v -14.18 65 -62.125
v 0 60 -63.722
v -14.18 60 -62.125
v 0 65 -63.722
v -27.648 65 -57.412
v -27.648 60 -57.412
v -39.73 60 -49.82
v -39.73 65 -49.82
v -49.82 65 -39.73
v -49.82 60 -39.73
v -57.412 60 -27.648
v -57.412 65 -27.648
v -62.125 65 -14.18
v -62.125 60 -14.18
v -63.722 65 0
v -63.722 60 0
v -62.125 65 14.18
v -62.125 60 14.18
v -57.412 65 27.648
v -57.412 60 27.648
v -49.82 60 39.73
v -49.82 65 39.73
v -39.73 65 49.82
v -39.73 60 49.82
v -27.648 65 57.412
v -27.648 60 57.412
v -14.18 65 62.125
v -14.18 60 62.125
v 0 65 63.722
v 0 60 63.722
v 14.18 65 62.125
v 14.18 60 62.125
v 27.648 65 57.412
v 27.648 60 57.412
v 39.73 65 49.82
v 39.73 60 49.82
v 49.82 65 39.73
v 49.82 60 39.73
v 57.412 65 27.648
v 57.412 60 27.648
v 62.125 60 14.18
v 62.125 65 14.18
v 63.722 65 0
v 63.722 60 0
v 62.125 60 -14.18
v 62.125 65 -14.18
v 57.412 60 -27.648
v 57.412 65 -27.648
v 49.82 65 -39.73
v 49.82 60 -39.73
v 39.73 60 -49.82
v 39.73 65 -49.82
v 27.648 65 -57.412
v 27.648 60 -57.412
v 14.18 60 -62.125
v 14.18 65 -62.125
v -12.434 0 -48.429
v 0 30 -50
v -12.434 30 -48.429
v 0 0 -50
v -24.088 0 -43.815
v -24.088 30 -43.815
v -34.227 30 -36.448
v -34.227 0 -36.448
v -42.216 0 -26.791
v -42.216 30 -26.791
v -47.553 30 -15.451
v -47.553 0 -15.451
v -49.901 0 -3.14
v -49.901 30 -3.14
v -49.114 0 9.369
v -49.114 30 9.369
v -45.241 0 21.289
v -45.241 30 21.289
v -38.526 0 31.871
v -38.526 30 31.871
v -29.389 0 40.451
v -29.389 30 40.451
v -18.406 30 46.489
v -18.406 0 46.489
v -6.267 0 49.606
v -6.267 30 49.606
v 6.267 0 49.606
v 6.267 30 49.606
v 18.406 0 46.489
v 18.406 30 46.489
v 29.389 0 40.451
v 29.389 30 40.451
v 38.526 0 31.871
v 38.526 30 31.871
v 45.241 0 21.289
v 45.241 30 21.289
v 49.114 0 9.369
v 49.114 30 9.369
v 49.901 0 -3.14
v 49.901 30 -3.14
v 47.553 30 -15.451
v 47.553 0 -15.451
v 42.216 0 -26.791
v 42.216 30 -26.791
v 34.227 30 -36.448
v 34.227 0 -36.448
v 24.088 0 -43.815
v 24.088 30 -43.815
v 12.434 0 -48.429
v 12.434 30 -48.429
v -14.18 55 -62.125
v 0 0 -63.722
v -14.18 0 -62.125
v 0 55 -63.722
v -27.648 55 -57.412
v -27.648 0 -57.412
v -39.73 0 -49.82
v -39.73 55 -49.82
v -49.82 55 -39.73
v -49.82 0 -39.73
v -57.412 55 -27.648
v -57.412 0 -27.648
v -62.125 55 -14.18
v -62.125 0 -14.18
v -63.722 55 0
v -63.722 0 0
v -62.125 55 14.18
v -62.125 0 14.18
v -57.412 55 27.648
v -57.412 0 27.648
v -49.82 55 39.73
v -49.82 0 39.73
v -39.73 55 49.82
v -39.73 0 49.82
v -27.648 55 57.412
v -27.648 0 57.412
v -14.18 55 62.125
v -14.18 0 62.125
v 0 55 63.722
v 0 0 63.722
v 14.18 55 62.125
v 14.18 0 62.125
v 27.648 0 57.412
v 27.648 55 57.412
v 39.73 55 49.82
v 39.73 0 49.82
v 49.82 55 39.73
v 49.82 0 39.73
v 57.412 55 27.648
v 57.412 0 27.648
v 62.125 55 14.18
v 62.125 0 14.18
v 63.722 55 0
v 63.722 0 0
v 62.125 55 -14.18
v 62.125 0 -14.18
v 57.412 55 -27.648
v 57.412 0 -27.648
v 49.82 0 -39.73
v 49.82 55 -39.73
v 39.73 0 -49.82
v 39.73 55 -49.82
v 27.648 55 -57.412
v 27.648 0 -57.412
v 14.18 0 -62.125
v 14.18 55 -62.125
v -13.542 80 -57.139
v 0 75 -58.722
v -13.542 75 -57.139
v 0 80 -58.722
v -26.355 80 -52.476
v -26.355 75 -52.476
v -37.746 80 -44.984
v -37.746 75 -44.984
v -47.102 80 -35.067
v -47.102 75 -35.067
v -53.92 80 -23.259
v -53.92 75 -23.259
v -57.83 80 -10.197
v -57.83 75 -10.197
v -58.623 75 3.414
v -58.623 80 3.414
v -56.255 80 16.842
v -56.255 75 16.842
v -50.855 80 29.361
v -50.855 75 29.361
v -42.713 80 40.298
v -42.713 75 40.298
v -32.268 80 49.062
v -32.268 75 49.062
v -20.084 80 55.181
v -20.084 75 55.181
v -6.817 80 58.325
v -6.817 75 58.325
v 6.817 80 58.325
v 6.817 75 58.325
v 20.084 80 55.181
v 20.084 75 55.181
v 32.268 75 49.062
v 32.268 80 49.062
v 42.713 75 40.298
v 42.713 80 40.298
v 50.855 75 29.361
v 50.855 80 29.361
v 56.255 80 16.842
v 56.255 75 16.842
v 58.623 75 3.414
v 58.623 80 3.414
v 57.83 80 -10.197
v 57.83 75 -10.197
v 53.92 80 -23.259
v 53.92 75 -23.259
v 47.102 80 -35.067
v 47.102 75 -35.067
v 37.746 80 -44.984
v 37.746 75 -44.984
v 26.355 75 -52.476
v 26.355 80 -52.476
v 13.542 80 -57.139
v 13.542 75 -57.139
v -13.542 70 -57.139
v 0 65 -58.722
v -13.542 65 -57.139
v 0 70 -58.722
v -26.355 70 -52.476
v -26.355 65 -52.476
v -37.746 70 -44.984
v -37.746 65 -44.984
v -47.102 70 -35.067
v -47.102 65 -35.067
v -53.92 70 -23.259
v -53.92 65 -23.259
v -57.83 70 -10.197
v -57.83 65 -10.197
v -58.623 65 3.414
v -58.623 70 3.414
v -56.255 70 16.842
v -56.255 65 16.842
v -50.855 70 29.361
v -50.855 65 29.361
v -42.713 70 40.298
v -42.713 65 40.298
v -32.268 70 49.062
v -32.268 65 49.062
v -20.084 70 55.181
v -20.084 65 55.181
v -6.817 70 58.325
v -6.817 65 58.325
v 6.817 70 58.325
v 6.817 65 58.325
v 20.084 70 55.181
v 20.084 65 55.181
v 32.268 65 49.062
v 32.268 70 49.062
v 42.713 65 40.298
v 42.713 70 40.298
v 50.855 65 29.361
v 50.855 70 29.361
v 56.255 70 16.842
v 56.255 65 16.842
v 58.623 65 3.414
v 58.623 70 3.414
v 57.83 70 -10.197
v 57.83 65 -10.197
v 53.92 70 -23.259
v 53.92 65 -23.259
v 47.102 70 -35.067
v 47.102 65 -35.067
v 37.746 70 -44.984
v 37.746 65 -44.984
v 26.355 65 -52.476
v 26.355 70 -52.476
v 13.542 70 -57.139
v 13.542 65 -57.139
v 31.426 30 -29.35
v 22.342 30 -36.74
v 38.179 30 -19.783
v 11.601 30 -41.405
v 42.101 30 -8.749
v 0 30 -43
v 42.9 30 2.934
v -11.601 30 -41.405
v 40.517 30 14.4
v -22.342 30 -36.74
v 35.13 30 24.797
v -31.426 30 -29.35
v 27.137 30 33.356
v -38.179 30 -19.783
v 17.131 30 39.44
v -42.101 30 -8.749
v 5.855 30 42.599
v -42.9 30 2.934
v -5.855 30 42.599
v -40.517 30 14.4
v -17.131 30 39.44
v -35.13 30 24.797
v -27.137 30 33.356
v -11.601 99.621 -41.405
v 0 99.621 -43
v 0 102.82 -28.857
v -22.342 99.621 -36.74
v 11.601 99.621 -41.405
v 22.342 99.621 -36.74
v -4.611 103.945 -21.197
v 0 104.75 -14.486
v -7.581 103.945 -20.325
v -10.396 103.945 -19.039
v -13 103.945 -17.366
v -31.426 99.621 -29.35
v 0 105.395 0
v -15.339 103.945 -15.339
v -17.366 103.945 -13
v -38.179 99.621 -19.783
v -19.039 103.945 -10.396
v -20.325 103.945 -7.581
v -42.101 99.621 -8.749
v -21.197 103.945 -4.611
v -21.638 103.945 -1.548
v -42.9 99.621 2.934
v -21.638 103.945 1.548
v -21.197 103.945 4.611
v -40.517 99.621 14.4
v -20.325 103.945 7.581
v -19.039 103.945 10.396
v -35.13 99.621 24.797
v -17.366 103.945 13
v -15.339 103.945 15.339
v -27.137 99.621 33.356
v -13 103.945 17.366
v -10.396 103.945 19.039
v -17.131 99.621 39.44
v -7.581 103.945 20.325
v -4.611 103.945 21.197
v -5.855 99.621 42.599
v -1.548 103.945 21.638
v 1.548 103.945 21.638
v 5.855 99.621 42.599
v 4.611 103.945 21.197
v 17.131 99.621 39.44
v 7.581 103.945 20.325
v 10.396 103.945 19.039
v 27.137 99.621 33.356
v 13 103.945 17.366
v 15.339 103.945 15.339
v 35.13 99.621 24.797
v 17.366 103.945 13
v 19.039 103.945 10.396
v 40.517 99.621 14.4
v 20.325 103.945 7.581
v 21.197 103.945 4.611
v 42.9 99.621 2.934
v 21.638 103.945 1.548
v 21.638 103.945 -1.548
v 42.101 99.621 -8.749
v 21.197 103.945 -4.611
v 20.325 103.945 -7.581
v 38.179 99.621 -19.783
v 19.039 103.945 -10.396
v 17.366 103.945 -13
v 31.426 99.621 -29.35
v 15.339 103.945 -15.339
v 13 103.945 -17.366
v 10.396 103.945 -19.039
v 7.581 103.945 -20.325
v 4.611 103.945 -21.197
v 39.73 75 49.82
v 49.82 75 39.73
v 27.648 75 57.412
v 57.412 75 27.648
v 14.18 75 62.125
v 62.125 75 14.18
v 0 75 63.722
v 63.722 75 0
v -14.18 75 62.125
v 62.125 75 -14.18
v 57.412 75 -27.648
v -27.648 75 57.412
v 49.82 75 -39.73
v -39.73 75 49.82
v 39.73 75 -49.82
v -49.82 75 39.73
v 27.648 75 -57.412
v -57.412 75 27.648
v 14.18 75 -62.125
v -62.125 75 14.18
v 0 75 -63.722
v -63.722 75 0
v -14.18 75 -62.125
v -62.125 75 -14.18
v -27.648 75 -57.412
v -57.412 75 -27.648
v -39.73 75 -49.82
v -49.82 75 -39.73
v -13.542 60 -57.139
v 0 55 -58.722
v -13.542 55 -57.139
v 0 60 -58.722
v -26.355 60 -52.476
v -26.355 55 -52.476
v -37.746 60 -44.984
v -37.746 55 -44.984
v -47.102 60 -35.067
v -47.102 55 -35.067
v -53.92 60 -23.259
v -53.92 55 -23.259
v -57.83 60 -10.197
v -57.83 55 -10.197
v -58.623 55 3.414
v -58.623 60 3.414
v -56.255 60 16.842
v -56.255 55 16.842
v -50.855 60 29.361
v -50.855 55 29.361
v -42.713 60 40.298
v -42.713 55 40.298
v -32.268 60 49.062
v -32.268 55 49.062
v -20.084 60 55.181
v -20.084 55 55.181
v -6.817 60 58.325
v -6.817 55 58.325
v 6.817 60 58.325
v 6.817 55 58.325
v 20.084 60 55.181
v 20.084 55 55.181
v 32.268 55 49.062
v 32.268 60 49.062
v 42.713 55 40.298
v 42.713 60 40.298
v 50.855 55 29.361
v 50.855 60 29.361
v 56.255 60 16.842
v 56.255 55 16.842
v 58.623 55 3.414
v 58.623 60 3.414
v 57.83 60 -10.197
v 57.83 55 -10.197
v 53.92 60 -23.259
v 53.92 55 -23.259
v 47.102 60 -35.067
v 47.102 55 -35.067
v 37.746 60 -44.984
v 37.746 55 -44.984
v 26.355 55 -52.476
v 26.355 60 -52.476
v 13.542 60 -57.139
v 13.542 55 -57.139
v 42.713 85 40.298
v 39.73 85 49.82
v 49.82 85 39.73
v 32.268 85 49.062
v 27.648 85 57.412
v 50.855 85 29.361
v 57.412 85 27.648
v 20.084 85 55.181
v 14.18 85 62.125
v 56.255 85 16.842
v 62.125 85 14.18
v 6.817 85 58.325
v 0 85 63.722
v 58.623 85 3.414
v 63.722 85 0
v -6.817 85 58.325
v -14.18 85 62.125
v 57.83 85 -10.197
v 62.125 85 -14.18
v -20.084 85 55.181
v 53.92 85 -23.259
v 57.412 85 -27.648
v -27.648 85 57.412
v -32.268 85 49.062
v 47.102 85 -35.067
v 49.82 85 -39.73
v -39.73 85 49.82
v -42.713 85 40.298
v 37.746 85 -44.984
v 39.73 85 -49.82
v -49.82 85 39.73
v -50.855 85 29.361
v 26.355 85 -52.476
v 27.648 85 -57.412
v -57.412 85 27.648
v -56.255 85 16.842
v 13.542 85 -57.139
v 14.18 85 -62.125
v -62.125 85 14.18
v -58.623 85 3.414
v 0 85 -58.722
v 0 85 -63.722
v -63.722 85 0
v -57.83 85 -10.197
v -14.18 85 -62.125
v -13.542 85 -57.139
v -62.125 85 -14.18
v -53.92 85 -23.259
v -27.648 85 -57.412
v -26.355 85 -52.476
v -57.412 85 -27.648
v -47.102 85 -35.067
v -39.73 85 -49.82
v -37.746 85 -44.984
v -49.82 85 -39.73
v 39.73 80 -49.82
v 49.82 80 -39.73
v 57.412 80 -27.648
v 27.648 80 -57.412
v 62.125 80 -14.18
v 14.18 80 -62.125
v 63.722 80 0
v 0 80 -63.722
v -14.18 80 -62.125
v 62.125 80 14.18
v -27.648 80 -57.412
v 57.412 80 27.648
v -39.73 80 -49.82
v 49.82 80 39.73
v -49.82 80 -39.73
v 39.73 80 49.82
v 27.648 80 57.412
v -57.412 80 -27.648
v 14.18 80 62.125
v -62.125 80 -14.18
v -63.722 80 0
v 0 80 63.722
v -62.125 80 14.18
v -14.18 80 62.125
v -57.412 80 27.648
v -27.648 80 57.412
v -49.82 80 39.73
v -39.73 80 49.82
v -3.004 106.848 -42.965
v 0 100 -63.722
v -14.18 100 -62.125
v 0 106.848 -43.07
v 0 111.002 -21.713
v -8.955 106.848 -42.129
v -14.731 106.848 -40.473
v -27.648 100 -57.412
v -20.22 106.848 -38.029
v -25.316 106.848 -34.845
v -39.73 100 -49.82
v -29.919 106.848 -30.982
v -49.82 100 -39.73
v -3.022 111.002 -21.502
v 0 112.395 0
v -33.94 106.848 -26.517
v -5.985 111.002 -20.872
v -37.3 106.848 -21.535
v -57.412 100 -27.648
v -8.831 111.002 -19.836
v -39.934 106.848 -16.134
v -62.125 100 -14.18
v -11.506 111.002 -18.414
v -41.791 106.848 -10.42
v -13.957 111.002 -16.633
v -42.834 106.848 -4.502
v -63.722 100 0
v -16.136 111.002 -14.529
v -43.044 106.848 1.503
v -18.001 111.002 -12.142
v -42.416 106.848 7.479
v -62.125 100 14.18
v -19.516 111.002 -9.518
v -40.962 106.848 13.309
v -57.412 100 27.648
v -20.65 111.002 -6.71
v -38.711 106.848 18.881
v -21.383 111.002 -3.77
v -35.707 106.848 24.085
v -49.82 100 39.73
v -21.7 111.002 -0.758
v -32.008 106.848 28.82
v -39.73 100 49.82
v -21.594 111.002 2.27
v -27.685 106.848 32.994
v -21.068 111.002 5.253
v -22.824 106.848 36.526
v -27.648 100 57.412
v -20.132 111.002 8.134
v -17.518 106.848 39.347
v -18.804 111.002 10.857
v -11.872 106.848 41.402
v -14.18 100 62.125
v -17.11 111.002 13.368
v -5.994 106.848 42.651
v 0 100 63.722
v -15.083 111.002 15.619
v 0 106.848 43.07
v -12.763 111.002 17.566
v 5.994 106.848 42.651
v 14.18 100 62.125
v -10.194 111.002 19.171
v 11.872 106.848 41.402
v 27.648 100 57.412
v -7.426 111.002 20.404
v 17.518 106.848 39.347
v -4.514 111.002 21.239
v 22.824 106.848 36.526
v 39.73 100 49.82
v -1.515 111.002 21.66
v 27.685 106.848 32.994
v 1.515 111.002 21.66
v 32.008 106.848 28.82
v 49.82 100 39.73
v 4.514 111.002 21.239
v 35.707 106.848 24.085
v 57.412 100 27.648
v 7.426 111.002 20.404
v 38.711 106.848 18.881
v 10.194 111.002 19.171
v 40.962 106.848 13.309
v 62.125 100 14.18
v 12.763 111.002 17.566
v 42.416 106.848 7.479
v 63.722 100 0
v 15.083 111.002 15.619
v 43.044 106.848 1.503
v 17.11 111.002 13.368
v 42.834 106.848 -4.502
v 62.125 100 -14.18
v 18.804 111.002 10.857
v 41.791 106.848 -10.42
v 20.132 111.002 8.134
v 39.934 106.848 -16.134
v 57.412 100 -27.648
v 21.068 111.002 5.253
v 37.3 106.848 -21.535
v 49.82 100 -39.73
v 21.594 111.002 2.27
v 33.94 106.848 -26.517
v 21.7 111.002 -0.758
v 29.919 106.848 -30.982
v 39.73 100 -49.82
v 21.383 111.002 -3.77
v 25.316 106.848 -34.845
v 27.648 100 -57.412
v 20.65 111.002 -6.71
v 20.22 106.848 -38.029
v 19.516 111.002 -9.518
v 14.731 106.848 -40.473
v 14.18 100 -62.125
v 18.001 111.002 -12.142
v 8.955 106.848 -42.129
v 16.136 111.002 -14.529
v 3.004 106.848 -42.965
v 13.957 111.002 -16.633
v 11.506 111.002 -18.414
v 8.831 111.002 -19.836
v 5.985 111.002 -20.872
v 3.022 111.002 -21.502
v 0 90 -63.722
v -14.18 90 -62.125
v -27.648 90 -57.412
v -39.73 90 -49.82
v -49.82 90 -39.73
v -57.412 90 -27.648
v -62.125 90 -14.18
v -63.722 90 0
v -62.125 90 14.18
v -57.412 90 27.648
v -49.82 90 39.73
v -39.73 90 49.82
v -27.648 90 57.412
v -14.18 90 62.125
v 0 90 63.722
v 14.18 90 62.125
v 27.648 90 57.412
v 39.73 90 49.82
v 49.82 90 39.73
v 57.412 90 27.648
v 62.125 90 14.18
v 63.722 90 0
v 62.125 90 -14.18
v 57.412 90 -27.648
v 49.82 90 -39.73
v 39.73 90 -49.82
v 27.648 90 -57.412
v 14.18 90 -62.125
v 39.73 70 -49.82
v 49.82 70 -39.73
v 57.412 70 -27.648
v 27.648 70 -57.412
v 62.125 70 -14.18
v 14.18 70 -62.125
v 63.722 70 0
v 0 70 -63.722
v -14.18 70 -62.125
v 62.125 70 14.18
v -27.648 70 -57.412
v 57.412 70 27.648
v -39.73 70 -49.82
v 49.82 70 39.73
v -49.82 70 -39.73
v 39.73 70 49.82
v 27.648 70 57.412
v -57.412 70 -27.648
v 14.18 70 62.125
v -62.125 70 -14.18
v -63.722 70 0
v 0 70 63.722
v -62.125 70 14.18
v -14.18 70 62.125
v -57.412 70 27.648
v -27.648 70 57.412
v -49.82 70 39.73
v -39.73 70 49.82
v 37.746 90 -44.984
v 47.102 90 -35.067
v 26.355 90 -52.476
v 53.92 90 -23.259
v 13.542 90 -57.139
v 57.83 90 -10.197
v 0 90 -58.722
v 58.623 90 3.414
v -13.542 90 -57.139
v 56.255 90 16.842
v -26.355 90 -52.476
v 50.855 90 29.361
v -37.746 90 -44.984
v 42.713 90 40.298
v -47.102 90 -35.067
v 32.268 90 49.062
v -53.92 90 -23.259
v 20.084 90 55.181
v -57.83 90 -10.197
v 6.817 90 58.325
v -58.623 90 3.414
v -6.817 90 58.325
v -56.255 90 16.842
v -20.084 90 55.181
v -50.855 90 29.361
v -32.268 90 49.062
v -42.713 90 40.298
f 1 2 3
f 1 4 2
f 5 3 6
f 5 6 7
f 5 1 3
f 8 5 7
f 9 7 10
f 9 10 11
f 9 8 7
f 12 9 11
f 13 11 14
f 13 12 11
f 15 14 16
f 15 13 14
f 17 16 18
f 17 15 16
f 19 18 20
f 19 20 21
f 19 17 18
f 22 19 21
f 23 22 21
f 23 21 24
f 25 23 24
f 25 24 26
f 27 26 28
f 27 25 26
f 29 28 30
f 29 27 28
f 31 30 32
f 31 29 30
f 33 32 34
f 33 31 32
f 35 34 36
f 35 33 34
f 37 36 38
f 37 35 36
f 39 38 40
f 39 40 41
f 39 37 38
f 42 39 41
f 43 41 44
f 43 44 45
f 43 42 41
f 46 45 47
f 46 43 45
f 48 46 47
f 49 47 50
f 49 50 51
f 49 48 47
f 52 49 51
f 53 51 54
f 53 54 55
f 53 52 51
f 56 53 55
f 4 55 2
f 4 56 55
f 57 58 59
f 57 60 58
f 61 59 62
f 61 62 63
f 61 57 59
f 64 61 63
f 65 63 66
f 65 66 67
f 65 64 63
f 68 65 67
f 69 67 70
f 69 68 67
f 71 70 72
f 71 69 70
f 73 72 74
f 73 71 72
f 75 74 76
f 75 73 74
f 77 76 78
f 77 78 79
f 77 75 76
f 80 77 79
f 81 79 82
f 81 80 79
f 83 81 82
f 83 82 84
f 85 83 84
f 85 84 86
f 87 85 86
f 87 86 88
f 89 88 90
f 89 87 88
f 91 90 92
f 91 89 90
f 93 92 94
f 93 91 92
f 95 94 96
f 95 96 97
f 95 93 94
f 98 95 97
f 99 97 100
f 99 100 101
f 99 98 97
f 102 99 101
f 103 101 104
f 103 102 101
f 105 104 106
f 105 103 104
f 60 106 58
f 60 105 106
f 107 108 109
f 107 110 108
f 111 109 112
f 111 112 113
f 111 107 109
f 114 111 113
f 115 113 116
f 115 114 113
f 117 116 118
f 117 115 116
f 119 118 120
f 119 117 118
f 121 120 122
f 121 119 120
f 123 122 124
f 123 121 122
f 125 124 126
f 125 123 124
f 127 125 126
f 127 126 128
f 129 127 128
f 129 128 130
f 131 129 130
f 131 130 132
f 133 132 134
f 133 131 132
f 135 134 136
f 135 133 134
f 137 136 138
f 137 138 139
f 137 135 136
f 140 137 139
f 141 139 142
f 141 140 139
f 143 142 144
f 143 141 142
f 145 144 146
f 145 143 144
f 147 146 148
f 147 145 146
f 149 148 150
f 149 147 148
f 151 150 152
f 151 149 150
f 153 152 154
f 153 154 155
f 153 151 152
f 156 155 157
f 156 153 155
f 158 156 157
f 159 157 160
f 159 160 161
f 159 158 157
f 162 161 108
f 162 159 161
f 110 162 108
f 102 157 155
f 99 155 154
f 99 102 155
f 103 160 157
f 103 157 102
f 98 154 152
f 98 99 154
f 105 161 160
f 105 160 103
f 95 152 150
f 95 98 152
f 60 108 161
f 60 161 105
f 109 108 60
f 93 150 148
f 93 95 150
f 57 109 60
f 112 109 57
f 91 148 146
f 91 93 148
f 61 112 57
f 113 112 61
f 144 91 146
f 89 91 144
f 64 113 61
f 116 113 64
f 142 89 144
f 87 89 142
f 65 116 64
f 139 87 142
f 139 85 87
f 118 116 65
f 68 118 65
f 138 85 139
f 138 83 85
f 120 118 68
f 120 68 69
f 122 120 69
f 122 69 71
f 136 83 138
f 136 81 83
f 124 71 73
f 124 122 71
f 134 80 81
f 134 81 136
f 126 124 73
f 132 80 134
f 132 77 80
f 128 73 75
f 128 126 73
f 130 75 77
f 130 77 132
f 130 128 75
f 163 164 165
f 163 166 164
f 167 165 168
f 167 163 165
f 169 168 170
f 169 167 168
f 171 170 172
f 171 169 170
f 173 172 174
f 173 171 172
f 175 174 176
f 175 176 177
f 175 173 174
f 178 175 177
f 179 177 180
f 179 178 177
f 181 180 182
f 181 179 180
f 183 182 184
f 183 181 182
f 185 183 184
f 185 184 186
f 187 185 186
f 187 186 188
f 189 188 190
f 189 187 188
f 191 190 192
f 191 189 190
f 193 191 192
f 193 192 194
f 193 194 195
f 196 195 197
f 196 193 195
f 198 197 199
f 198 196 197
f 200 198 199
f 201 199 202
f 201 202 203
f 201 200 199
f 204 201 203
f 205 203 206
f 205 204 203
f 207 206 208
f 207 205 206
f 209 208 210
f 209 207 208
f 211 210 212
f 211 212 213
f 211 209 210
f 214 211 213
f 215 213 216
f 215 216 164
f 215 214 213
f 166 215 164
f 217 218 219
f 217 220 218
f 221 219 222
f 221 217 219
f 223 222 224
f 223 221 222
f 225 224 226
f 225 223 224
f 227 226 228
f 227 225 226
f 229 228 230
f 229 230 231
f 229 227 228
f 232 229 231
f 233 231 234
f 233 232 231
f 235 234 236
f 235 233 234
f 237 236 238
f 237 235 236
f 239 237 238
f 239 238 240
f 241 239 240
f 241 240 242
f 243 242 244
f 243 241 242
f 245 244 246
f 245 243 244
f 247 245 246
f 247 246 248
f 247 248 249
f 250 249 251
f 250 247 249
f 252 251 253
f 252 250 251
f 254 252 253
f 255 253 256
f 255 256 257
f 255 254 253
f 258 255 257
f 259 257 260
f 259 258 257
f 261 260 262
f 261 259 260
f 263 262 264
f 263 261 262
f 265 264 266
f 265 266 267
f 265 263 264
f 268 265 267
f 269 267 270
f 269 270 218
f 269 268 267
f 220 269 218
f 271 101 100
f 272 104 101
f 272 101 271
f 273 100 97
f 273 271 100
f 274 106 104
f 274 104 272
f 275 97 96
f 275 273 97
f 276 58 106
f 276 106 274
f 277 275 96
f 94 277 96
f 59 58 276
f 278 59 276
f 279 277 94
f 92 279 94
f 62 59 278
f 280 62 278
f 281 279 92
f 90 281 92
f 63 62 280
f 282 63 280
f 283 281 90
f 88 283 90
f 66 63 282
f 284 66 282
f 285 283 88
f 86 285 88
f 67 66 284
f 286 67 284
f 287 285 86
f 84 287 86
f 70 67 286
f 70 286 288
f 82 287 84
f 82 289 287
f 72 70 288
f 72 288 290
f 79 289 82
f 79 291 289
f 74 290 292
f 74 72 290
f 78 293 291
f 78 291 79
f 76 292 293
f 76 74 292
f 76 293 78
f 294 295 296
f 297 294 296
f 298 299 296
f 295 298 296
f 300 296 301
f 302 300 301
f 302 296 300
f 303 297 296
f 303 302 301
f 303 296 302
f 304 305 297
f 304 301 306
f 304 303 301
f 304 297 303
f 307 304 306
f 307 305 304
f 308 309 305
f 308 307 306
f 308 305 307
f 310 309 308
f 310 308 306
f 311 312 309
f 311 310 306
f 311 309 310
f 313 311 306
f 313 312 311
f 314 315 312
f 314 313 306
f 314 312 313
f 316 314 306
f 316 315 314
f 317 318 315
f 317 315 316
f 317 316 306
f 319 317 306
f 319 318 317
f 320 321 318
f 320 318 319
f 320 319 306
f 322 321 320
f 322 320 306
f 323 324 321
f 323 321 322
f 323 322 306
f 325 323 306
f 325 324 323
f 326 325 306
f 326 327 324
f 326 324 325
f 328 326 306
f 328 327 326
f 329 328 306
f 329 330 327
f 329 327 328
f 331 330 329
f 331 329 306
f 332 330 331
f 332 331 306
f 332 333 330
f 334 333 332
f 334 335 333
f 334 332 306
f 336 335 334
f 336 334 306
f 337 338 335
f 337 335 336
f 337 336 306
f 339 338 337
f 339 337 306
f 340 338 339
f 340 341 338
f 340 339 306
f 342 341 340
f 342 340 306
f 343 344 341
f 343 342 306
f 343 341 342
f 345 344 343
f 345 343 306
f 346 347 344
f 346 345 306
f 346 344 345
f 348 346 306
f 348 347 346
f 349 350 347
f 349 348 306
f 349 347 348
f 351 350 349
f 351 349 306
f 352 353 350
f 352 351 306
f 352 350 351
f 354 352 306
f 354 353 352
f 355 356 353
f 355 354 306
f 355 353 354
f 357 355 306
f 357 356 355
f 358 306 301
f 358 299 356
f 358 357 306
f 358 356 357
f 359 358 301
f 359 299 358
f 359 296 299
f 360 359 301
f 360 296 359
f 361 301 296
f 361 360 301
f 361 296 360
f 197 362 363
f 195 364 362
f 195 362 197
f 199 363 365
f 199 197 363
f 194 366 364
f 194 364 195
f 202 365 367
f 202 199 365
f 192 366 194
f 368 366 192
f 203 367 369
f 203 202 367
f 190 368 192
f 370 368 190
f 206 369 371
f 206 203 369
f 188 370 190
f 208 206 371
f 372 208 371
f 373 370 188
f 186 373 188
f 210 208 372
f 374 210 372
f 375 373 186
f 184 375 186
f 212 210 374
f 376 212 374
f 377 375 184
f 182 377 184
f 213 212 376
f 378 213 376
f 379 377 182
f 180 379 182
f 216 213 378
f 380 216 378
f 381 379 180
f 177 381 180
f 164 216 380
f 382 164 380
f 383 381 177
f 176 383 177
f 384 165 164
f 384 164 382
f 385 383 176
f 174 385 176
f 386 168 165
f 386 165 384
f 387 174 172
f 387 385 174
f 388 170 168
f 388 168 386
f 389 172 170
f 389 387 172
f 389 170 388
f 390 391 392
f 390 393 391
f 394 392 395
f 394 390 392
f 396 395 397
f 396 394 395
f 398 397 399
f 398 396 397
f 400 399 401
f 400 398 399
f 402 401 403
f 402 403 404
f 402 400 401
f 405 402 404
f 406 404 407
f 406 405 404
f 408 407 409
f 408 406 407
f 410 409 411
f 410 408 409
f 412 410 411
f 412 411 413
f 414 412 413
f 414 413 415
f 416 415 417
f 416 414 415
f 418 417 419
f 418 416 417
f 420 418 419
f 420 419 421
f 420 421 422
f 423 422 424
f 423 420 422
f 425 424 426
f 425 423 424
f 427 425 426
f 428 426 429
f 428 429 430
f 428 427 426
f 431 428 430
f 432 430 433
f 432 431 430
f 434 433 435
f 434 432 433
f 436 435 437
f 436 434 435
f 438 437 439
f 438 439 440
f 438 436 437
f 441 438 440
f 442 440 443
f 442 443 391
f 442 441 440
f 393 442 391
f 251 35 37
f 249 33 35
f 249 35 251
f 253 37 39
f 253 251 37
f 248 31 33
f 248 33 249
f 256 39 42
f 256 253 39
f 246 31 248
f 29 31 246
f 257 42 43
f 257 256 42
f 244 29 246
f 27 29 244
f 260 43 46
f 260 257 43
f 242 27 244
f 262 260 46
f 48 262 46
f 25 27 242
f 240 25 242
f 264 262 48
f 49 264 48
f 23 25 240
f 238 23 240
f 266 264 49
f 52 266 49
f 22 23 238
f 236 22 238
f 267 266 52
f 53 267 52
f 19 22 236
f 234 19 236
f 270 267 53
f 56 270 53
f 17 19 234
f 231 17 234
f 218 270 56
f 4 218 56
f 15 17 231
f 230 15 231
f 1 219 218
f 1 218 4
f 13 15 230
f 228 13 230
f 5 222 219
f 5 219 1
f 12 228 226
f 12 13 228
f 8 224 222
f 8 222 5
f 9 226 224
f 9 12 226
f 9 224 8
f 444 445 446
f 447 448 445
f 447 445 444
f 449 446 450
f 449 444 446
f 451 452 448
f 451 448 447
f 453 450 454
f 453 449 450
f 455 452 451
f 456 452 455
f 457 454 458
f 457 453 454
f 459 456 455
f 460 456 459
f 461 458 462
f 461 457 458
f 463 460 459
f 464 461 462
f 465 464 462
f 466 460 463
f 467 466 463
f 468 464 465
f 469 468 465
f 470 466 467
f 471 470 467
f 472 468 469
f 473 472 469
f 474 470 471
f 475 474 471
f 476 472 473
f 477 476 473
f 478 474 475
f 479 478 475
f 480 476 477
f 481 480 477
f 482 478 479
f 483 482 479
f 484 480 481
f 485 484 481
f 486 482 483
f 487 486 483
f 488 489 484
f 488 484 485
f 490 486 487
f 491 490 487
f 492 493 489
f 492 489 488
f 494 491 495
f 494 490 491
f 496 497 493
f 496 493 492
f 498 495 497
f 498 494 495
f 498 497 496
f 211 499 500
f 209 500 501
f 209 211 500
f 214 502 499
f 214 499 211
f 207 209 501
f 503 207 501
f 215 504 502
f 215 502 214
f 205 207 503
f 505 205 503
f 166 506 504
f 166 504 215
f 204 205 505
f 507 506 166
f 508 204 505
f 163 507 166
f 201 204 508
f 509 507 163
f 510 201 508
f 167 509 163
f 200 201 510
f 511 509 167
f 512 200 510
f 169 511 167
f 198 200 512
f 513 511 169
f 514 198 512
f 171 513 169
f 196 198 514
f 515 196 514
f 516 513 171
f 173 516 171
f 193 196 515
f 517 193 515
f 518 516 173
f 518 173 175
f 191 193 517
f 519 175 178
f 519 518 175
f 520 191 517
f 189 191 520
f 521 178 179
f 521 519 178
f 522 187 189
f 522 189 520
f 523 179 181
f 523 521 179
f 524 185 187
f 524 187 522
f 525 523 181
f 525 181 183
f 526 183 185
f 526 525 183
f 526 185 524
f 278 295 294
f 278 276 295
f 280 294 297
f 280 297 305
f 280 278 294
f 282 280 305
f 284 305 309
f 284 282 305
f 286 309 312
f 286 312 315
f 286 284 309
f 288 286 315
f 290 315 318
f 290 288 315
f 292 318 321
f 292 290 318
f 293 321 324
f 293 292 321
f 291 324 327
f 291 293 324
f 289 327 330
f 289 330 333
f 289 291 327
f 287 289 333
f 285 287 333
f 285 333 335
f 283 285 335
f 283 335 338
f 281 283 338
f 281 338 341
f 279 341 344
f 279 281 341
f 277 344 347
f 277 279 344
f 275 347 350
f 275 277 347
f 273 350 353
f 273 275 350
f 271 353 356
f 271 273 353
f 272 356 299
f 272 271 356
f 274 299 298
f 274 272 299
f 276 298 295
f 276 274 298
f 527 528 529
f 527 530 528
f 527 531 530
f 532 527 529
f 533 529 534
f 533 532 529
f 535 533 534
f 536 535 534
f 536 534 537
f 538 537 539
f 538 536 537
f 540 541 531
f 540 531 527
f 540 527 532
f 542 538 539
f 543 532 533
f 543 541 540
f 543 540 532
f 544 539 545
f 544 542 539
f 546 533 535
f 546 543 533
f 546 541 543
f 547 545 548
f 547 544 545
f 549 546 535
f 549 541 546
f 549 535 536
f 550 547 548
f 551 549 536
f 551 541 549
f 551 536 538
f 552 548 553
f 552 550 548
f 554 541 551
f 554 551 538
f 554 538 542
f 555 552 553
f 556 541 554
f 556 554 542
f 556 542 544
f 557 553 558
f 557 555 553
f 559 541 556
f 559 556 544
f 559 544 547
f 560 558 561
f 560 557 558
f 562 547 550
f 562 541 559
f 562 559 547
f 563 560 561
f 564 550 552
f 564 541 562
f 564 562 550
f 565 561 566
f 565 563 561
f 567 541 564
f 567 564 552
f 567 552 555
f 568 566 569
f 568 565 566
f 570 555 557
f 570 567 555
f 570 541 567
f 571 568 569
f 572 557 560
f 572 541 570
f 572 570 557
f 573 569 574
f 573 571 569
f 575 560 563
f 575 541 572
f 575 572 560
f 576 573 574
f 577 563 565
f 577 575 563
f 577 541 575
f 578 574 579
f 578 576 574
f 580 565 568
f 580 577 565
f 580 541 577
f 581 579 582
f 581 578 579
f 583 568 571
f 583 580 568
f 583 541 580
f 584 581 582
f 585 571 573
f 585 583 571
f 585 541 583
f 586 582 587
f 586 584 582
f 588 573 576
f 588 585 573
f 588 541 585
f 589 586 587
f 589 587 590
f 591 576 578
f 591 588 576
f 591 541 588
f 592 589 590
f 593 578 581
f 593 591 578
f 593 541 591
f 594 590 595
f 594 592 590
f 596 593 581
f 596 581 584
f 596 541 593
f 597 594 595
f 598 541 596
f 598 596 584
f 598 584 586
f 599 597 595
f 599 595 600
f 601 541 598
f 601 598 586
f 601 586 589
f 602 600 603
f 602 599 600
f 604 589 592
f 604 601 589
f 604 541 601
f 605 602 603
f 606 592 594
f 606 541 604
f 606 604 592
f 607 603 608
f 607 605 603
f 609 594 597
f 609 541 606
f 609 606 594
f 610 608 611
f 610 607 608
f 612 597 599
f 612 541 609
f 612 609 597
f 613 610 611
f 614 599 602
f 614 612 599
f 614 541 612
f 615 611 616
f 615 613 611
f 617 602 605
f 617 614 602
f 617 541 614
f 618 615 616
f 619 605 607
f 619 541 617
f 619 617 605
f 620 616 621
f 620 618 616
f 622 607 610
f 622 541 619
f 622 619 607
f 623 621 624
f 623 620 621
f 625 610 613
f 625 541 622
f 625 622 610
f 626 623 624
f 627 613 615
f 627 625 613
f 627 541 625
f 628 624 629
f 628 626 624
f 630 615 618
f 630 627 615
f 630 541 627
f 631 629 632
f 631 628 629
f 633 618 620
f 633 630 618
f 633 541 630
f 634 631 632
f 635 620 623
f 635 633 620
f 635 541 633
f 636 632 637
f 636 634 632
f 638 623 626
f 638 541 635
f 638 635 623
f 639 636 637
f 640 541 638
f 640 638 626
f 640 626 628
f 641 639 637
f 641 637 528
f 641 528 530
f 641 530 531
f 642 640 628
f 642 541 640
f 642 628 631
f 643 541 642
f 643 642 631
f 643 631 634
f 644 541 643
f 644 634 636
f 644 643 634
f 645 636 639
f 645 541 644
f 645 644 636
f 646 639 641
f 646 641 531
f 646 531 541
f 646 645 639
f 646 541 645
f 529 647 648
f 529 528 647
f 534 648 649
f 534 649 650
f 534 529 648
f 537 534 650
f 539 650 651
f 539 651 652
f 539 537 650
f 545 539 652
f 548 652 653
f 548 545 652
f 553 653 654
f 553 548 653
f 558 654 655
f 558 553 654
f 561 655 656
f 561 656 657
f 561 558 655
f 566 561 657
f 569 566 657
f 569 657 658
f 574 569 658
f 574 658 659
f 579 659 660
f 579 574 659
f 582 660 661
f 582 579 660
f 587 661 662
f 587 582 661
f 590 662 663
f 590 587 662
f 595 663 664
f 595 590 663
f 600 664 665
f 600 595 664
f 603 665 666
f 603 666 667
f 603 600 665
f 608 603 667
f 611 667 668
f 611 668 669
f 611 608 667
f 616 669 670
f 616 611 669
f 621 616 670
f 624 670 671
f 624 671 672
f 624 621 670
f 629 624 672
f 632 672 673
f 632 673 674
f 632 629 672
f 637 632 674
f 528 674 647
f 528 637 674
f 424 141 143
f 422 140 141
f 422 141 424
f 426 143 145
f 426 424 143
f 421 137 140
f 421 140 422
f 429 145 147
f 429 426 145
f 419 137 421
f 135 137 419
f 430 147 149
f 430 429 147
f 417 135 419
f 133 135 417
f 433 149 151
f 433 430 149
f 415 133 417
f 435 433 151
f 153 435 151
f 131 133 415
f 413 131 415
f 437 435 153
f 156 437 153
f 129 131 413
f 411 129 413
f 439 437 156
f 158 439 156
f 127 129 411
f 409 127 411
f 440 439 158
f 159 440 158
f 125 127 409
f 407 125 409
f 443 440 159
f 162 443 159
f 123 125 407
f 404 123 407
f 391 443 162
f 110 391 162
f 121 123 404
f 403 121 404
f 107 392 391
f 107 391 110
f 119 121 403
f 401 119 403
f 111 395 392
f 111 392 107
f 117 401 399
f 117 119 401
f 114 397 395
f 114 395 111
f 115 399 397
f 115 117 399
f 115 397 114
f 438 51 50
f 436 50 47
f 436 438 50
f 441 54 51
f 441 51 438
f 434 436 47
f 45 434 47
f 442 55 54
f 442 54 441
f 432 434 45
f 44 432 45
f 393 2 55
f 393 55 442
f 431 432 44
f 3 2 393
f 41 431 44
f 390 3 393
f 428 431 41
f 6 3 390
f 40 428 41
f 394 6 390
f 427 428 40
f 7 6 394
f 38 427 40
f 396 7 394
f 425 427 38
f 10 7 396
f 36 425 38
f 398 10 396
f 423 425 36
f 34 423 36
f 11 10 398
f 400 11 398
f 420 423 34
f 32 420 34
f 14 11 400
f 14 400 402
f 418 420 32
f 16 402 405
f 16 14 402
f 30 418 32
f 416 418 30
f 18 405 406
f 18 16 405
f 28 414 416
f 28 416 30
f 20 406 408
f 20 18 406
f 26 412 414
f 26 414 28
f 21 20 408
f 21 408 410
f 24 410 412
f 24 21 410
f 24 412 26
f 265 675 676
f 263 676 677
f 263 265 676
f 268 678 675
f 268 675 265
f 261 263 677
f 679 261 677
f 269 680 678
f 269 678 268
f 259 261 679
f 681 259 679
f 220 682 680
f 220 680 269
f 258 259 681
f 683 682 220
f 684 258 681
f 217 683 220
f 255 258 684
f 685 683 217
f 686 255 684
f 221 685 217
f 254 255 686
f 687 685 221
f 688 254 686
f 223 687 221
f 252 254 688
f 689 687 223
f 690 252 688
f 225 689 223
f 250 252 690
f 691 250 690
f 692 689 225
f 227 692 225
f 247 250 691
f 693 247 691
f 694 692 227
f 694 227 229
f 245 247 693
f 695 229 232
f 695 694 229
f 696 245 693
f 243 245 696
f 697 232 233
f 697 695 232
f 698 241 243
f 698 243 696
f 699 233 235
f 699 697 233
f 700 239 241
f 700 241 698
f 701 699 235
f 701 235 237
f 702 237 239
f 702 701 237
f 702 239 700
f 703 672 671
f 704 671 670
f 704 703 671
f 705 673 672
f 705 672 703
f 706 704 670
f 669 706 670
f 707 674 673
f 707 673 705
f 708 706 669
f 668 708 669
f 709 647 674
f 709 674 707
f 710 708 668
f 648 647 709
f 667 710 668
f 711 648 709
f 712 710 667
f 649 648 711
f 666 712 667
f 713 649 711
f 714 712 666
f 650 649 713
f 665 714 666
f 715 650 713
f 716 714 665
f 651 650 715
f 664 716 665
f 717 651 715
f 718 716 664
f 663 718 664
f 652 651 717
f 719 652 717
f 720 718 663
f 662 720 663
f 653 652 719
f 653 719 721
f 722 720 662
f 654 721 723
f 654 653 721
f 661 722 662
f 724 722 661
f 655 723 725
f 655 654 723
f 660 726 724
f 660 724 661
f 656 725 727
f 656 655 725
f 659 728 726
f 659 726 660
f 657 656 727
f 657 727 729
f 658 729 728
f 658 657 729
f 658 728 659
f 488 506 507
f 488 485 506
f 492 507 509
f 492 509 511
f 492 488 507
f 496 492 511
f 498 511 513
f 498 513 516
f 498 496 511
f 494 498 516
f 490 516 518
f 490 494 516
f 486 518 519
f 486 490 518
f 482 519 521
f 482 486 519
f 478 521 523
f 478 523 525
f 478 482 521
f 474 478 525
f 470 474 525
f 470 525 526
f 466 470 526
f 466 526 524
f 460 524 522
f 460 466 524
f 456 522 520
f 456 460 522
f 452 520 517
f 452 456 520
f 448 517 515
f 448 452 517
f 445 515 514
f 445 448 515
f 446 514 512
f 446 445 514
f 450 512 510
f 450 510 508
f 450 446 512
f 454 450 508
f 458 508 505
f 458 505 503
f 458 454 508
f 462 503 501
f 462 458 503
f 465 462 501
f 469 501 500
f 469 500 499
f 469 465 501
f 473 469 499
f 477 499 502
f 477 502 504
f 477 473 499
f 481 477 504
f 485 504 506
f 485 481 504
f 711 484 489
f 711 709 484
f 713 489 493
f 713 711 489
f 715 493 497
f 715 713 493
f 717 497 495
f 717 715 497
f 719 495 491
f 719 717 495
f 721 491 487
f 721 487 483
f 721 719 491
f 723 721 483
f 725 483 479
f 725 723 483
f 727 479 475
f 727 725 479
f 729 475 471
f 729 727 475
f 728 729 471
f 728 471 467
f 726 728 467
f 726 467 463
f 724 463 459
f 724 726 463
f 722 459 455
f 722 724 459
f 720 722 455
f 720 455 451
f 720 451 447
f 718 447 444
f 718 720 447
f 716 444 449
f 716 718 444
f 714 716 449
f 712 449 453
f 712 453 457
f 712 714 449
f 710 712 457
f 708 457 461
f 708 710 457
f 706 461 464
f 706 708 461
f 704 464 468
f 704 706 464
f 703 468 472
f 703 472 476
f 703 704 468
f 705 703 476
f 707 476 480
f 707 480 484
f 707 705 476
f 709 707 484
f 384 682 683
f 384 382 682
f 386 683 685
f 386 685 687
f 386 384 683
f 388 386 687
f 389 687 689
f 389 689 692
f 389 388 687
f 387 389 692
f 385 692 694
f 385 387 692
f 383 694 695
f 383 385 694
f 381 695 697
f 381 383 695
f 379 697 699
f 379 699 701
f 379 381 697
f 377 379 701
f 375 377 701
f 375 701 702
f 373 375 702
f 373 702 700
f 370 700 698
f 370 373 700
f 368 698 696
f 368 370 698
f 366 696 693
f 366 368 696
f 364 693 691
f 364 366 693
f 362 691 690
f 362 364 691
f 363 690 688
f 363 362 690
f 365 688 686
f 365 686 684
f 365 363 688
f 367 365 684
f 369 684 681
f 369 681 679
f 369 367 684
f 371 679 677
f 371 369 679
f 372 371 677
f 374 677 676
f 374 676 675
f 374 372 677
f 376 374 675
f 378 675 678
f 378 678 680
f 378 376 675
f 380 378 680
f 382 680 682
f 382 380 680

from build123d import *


with BuildPart() as part:
    # Sketch1 → Revolve1 (revolve)
    with BuildSketch(Plane.XY, mode=Mode.PRIVATE) as revolve1_sk:
        with BuildLine():
            Line((63.722275674, 0), (63.722275674, 55))
            Line((63.722275674, 55), (58.722275674, 55))
            Line((58.722275674, 55), (58.722275674, 60))
            Line((58.722275674, 60), (63.722275674, 60))
            Line((63.722275674, 60), (63.722275674, 65))
            Line((63.722275674, 65), (58.722275674, 65))
            Line((58.722275674, 65), (58.722275674, 70))
            Line((58.722275674, 70), (63.722275674, 70))
            Line((63.722275674, 70), (63.722275674, 75))
            Line((63.722275674, 75), (58.722275674, 75))
            Line((58.722275674, 75), (58.722275674, 80))
            Line((58.722275674, 80), (63.722275674, 80))
            Line((63.722275674, 80), (63.722275674, 85))
            Line((63.722275674, 85), (58.722275674, 85))
            Line((58.722275674, 85), (58.722275674, 90))
            Line((58.722275674, 90), (63.722275674, 90))
            Line((63.722275674, 90), (63.722275674, 100))
            ThreePointArc((63.722275674, 100), (32.458256966, 109.267160728), (0, 112.394569945))
            Line((0, 112.394569945), (0, 105.394569945))
            ThreePointArc((0, 105.394569945), (21.692969078, 103.944608919), (43, 99.620522001))
            Line((43, 99.620522001), (43, 30))
            Line((43, 30), (50, 30))
            Line((50, 30), (50, 0))
            Line((50, 0), (63.722275674, 0))
        make_face()
    revolve(revolve1_sk.sketch.rotate(Axis((0, 0, 0), (0, 1, 0)), 90), axis=Axis((0, 0, 0), (0, 1, 0)))


solid = part.part
